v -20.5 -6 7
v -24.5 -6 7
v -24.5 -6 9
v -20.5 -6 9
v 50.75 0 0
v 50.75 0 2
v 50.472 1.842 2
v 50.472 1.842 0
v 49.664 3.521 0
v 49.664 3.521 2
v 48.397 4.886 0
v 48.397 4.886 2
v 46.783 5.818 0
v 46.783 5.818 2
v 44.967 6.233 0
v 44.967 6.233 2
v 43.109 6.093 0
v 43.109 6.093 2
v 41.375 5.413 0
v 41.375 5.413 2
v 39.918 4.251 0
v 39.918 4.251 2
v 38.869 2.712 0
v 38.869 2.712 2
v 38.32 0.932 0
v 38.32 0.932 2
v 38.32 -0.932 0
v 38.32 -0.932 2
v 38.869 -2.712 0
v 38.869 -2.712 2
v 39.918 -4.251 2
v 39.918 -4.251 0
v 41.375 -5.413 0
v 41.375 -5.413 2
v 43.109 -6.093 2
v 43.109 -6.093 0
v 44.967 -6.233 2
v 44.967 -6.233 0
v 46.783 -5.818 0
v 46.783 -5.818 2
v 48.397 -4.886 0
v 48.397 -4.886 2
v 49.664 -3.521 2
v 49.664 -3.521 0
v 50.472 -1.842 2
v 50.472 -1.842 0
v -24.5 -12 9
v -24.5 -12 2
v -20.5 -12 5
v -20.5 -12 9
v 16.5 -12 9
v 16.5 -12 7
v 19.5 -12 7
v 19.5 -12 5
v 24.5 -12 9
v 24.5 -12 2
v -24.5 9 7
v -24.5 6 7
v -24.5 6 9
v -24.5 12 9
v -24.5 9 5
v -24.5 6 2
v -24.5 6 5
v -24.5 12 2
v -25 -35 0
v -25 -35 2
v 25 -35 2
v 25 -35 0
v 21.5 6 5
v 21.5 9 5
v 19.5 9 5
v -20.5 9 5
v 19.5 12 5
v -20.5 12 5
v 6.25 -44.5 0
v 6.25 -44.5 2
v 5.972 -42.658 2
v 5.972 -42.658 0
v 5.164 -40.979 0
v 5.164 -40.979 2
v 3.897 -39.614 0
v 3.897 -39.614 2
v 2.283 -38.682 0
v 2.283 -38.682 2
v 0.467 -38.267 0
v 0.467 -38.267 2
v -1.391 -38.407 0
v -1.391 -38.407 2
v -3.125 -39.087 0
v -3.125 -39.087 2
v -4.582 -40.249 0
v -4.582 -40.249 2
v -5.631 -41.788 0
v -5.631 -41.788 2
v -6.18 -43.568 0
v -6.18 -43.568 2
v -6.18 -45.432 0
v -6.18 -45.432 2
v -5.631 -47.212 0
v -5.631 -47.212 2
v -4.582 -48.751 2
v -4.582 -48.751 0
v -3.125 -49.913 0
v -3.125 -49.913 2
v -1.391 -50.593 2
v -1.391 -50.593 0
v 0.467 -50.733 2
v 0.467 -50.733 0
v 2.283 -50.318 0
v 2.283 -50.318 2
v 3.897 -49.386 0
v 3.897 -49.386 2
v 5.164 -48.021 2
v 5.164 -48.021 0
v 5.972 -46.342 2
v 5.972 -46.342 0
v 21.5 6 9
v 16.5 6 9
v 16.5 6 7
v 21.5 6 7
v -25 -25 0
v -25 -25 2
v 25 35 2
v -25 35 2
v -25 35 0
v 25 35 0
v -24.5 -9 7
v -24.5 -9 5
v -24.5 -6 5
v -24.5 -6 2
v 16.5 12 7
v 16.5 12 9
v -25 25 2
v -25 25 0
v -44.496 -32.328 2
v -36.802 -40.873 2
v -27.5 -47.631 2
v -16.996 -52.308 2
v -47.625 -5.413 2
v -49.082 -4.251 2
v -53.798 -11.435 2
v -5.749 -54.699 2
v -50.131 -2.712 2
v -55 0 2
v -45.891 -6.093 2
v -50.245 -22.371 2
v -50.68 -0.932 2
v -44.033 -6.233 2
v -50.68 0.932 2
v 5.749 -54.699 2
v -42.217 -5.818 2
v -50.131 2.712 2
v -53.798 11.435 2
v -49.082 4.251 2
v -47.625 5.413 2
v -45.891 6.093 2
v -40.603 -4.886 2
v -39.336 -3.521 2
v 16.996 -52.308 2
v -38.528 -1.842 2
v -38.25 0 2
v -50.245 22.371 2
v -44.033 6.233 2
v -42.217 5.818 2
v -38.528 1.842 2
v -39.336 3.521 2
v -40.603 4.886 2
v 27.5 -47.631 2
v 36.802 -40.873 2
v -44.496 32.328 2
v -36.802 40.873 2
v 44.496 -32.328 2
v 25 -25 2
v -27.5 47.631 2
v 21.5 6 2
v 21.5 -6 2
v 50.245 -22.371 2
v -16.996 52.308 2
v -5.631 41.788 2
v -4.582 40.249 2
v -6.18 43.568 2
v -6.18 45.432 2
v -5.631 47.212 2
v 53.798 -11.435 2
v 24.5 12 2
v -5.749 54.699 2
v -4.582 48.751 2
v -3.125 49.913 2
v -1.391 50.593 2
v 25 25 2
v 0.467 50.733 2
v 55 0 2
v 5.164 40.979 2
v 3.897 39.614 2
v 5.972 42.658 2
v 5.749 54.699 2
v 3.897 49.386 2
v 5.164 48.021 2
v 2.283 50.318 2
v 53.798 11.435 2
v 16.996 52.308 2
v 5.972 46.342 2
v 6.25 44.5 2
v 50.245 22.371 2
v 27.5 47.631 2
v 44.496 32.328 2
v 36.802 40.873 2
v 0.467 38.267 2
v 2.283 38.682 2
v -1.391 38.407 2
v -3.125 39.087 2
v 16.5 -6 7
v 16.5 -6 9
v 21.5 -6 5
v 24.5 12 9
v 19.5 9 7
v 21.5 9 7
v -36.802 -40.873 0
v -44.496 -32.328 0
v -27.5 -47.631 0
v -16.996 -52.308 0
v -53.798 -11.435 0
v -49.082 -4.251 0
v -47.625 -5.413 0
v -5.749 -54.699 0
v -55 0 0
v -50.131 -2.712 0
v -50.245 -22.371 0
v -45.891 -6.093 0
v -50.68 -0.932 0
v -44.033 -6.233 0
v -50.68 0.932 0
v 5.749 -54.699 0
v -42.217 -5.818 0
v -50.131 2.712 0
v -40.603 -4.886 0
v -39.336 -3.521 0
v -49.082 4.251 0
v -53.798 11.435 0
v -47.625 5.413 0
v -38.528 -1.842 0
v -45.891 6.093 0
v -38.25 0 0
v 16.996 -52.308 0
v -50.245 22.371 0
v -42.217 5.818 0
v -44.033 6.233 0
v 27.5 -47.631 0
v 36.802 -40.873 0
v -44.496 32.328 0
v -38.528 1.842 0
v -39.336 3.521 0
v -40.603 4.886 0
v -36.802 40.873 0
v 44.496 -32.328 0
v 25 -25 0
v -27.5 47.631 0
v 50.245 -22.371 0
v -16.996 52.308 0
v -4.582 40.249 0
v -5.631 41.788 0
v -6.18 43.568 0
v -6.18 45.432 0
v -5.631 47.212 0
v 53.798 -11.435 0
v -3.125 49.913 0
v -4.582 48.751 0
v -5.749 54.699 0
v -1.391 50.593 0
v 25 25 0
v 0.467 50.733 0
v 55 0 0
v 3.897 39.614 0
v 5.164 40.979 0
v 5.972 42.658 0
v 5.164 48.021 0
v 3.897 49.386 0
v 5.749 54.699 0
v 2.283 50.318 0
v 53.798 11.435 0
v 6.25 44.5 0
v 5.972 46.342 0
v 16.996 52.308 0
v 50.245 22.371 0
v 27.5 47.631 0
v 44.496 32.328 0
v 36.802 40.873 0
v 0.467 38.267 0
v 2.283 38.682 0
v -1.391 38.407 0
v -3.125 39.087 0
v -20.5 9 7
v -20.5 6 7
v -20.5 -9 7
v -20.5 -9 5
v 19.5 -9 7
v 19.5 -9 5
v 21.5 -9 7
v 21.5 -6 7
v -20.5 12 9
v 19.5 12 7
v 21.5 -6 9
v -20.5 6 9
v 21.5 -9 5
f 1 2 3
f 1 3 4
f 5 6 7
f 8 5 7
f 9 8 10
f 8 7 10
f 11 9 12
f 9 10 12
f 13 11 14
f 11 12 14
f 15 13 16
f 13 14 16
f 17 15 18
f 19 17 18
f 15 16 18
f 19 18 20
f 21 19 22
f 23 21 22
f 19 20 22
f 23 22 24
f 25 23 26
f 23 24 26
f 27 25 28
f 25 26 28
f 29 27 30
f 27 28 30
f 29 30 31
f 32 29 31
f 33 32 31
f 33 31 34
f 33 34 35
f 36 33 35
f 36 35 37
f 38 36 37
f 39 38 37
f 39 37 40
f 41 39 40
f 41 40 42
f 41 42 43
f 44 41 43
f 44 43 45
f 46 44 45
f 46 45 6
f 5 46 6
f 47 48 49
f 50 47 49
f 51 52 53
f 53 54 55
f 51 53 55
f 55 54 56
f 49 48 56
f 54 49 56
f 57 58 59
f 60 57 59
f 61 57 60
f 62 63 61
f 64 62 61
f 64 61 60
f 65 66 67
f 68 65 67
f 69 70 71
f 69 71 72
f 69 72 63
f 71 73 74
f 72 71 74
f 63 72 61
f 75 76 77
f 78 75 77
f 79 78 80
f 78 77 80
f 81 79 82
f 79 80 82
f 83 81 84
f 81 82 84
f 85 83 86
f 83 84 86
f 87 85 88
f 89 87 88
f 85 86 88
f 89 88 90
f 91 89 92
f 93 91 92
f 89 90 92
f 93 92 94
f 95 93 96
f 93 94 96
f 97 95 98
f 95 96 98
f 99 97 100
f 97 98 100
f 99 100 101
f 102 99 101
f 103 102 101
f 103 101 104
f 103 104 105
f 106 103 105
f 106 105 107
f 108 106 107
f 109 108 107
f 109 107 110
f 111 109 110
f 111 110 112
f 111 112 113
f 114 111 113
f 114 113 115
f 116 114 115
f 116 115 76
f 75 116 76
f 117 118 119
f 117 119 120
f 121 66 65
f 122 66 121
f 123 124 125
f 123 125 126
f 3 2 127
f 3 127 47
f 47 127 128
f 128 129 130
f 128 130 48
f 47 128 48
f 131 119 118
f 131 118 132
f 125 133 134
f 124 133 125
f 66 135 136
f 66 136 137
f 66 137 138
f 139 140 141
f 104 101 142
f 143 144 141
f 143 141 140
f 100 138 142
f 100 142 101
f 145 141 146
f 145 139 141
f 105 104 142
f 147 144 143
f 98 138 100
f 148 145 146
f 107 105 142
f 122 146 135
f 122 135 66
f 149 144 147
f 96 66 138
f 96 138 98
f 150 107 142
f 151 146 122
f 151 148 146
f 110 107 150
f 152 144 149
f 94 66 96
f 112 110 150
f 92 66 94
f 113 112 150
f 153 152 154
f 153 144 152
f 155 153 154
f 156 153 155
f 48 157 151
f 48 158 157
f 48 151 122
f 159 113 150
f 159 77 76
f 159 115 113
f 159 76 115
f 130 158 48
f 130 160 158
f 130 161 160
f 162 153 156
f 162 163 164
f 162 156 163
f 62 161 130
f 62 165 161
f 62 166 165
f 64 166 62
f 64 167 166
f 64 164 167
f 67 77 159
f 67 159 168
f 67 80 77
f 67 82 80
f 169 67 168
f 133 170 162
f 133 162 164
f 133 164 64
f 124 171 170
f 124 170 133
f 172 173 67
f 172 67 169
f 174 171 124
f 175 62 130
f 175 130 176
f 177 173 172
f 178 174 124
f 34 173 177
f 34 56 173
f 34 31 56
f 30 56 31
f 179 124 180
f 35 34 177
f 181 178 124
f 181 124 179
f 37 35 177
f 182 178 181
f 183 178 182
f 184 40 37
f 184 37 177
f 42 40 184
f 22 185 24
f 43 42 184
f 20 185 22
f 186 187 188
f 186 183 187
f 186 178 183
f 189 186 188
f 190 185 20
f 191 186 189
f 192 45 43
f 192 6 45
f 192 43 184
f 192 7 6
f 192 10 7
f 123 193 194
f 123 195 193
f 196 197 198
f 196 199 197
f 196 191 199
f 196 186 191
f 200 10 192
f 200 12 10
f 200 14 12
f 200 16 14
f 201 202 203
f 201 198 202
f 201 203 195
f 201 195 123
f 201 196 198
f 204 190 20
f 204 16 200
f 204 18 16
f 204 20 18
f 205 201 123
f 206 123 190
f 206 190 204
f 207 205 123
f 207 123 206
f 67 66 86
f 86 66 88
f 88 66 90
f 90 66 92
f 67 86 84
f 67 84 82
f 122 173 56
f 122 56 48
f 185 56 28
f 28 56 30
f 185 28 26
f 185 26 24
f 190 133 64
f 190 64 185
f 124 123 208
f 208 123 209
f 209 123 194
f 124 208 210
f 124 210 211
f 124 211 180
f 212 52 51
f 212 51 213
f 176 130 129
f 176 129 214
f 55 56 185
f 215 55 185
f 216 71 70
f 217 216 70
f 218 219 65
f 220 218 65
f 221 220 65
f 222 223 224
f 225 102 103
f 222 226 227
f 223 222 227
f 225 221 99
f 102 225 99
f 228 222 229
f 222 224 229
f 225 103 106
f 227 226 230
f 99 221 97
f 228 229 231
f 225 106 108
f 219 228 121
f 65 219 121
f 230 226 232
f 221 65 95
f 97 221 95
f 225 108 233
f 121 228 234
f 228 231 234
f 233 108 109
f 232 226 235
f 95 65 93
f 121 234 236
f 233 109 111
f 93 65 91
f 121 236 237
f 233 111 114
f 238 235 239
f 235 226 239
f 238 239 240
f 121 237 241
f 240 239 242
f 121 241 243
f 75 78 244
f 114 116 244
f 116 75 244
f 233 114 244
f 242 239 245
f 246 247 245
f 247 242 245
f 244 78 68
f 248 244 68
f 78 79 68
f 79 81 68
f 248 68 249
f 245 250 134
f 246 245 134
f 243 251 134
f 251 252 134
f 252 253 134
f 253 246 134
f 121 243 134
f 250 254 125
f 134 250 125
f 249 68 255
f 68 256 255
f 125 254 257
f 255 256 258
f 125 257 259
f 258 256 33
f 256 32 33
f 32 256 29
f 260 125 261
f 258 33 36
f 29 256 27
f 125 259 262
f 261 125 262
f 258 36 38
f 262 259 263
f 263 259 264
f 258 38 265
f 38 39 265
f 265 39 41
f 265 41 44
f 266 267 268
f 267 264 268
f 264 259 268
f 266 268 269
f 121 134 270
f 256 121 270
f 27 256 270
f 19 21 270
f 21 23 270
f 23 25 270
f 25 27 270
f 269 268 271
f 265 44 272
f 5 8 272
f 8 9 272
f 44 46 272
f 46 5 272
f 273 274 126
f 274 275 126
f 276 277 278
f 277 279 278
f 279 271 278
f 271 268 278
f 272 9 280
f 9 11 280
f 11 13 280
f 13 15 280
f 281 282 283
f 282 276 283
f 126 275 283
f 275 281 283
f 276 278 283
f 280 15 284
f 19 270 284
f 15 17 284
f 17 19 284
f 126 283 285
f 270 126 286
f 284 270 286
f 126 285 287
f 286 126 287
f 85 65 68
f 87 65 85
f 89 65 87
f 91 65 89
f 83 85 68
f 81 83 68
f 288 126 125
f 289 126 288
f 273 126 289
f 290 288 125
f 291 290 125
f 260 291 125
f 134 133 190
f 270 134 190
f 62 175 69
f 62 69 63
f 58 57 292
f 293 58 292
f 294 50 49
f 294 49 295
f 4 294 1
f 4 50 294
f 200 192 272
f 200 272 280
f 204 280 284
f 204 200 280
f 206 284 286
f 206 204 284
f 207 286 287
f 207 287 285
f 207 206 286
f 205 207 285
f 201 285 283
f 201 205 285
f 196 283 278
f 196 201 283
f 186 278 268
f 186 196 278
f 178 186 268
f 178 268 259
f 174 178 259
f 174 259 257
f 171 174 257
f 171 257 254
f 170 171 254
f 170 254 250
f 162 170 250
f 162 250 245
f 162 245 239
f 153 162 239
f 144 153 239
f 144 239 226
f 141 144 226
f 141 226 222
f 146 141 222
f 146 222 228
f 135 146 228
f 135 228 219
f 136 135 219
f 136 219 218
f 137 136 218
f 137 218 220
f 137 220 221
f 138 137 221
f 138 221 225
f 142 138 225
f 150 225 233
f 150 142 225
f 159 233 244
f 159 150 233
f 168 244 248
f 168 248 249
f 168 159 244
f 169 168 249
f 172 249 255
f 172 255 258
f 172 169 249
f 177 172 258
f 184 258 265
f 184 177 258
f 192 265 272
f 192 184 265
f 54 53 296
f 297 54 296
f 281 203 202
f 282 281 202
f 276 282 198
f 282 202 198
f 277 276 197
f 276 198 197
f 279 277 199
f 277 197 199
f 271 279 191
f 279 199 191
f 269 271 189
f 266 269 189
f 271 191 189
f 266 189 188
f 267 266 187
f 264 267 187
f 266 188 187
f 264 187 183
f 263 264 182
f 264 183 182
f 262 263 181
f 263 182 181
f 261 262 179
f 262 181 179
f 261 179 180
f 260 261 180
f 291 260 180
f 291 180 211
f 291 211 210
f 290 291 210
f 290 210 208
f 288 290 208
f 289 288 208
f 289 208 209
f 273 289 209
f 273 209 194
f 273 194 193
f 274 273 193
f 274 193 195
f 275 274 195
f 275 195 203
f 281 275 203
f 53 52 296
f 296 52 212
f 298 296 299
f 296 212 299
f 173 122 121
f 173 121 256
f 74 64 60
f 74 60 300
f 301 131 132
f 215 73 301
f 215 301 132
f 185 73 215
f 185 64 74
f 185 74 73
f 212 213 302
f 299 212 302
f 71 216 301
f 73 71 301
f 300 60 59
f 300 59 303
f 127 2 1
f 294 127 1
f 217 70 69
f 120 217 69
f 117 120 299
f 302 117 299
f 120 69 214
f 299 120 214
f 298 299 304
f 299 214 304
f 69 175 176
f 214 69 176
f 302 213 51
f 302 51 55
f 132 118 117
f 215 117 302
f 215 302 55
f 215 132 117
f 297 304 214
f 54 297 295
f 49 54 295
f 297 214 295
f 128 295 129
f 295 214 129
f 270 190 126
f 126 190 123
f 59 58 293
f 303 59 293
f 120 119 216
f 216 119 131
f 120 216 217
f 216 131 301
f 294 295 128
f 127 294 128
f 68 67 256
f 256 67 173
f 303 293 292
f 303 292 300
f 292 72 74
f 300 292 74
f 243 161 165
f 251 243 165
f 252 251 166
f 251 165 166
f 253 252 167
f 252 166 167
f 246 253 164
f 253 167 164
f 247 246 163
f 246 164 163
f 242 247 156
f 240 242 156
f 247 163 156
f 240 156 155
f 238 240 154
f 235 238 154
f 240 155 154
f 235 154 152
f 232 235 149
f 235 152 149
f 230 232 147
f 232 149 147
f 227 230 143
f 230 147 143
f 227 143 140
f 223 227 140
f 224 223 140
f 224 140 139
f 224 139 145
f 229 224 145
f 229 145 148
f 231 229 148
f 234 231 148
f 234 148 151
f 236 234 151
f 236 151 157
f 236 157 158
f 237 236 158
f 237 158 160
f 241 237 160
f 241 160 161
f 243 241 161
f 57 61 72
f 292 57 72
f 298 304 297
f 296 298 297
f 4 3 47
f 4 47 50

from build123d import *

# Parameters (mm, degrees)
SKETCH4_R            = 59
BOSS_EXTRUDE3_DEPTH  = 2
SKETCH5_R            = 1.375
BOSS_EXTRUDE5_DEPTH  = 7
SKETCH8_R            = 2.375
BOSS_EXTRUDE6_DEPTH  = 2
BOSS_EXTRUDE7_DEPTH  = 18
SKETCH10_R           = 7.5
CUT_EXTRUDE1_DEPTH   = 18
SKETCH12_R           = 57.5
CUT_EXTRUDE2_DEPTH   = 5
CUT_EXTRUDE3_DEPTH   = 5.5
SKETCH14_R           = 44.428135616
CUT_EXTRUDE4_DEPTH   = 32
BOSS_EXTRUDE8_DEPTH  = 3
BOSS_EXTRUDE9_DEPTH  = 2
SKETCH18_W           = 40
SKETCH18_H           = 24
CUT_EXTRUDE5_DEPTH   = 2
SKETCH19_W           = 4
SKETCH19_H           = 6
SKETCH19_W_2         = 8
SKETCH19_H_2         = 24
BOSS_EXTRUDE10_DEPTH = 2
SKETCH20_R           = 71.034408428
SKETCH20_R_2         = 50.972397724
CUT_EXTRUDE6_DEPTH   = 57
SKETCH21_R           = 79.144233261
SKETCH21_R_2         = 57
CUT_EXTRUDE8_DEPTH   = 57
BOSS_EXTRUDE11_DEPTH = 22
SKETCH24_R           = 89.588110905
SKETCH24_R_2         = 57
CUT_EXTRUDE12_DEPTH  = 75
SKETCH25_R           = 63.08525578
SKETCH25_R_2         = 55
CUT_EXTRUDE13_DEPTH  = 10
SKETCH26_R           = 62.71577626
SKETCH26_R_2         = 55
CUT_EXTRUDE14_DEPTH  = 43
SKETCH27_R           = 8.628716001
SKETCH27_R_2         = 7.77122145
SKETCH27_R_3         = 11.532169803
SKETCH27_R_4         = 7.052668864
CUT_EXTRUDE15_DEPTH  = 22
SKETCH28_R           = 55
BOSS_EXTRUDE12_DEPTH = 2
SKETCH29_W           = 5
SKETCH29_H           = 12
CUT_EXTRUDE16_DEPTH  = 3
SKETCH30_R           = 6.25
CUT_EXTRUDE17_DEPTH  = 3
SKETCH31_W           = 50
SKETCH31_H           = 10
CUT_EXTRUDE18_DEPTH  = 3


with BuildPart() as part:
    # Sketch4 → Boss-Extrude3 (new body)
    with BuildSketch(Plane.XY):
        Circle(SKETCH4_R)
    extrude(amount=BOSS_EXTRUDE3_DEPTH)

    # Sketch5 → Boss-Extrude5 (add)
    with BuildSketch(Plane.XY.offset(2)):
        with Locations((-22.5, 27.5)):
            Circle(SKETCH5_R)
        with Locations((22.5, 27.5)):
            Circle(SKETCH5_R)
        with Locations((22.5, -27.5)):
            Circle(SKETCH5_R)
        with Locations((-22.5, -27.5)):
            Circle(SKETCH5_R)
    extrude(amount=BOSS_EXTRUDE5_DEPTH)

    # Sketch8 → Boss-Extrude6 (add)
    with BuildSketch(Plane.XY.offset(2)):
        with Locations((-22.5, 27.5)):
            Circle(SKETCH8_R)
        with Locations((22.5, 27.5)):
            Circle(SKETCH8_R)
        with Locations((-22.5, -27.5)):
            Circle(SKETCH8_R)
        with Locations((22.5, -27.5)):
            Circle(SKETCH8_R)
    extrude(amount=BOSS_EXTRUDE6_DEPTH)

    # Sketch9 → Boss-Extrude7 (add)
    with BuildSketch(Plane.XY.offset(2)):
        with BuildLine():
            ThreePointArc((-4.745762712, 55.798546005), (0, 56), (4.745762712, 55.798546005))
            Line((4.745762712, 55.798546005), (5, 58.787753827))
            ThreePointArc((5, 58.787753827), (0, 59), (-5, 58.787753827))
            Line((-5, 58.787753827), (-4.745762712, 55.798546005))
        make_face()
        with BuildLine():
            Line((-55.798546005, 4.745762712), (-58.787753827, 5))
            ThreePointArc((-58.787753827, 5), (-59, 0), (-58.787753827, -5))
            Line((-58.787753827, -5), (-55.798546005, -4.745762712))
            ThreePointArc((-55.798546005, -4.745762712), (-56, 0), (-55.798546005, 4.745762712))
        make_face()
        with BuildLine():
            ThreePointArc((58.787753827, -5), (59, 0), (58.787753827, 5))
            Line((58.787753827, 5), (55.798546005, 4.745762712))
            ThreePointArc((55.798546005, 4.745762712), (56, 0), (55.798546005, -4.745762712))
            Line((55.798546005, -4.745762712), (58.787753827, -5))
        make_face()
        with BuildLine():
            ThreePointArc((-4.745762712, -55.798546005), (0, -56), (4.745762712, -55.798546005))
            Line((4.745762712, -55.798546005), (5, -58.787753827))
            ThreePointArc((5, -58.787753827), (0, -59), (-5, -58.787753827))
            Line((-5, -58.787753827), (-4.745762712, -55.798546005))
        make_face()
    extrude(amount=BOSS_EXTRUDE7_DEPTH)

    # Sketch10 → Cut-Extrude1 (cut)
    with BuildSketch(Plane.XY.offset(2)):
        with Locations((-40, 0)):
            Circle(SKETCH10_R)
    extrude(amount=-CUT_EXTRUDE1_DEPTH, mode=Mode.SUBTRACT)

    # Sketch12 → Cut-Extrude2 (cut)
    with BuildSketch(Plane.XY.offset(20)):
        Circle(SKETCH12_R)
    extrude(amount=-CUT_EXTRUDE2_DEPTH, mode=Mode.SUBTRACT)

    # Sketch13 → Cut-Extrude3 (cut)
    with BuildSketch(Plane(origin=(0, 0, 0), x_dir=(-1, 0, 0), z_dir=(0, 0, -1))):
        with BuildLine():
            Line((-57.243329786, 4.868644068), (-58.787753827, 5))
            ThreePointArc((-58.787753827, 5), (-59, 0), (-58.787753827, -5))
            Line((-58.787753827, -5), (-57.243329786, -4.868644068))
            ThreePointArc((-57.243329786, -4.868644068), (-57.45, 0), (-57.243329786, 4.868644068))
        make_face()
        with BuildLine():
            ThreePointArc((5, 58.787753827), (0, 59), (-5, 58.787753827))
            Line((-5, 58.787753827), (-4.868644068, 57.243329786))
            ThreePointArc((-4.868644068, 57.243329786), (0, 57.45), (4.868644068, 57.243329786))
            Line((4.868644068, 57.243329786), (5, 58.787753827))
        make_face()
        with BuildLine():
            Line((-4.868644068, -57.243329786), (-5, -58.787753827))
            ThreePointArc((-5, -58.787753827), (0, -59), (5, -58.787753827))
            Line((5, -58.787753827), (4.868644068, -57.243329786))
            ThreePointArc((4.868644068, -57.243329786), (0, -57.45), (-4.868644068, -57.243329786))
        make_face()
        with BuildLine():
            ThreePointArc((58.787753827, -5), (59, 0), (58.787753827, 5))
            Line((58.787753827, 5), (57.243329786, 4.868644068))
            ThreePointArc((57.243329786, 4.868644068), (57.45, 0), (57.243329786, -4.868644068))
            Line((57.243329786, -4.868644068), (58.787753827, -5))
        make_face()
    extrude(amount=-CUT_EXTRUDE3_DEPTH, mode=Mode.SUBTRACT)

    # Sketch14 → Cut-Extrude4 (cut)
    with BuildSketch(Plane.XY.offset(2)):
        Circle(SKETCH14_R)
    extrude(amount=CUT_EXTRUDE4_DEPTH, mode=Mode.SUBTRACT)

    # Sketch15 → Boss-Extrude8 (add)
    with BuildSketch(Plane.XY.offset(2)):
        Polygon((21.5, -6), (21.5, 6), (-24.5, 6), (-24.5, 12), (24.5, 12), (24.5, -12), (-24.5, -12), (-24.5, -6), align=None)
    extrude(amount=BOSS_EXTRUDE8_DEPTH)

    # Sketch17 → Boss-Extrude9 (add)
    with BuildSketch(Plane.XY.offset(5)):
        Polygon((21.5, -9), (-21.5, -9), (-24.5, -9), (-24.5, -12), (24.5, -12), (24.5, 12), (-24.5, 12), (-24.5, 9), (-21.5, 9), (21.5, 9), align=None)
    extrude(amount=BOSS_EXTRUDE9_DEPTH)

    # Sketch18 → Cut-Extrude5 (cut)
    with BuildSketch(Plane.XY.offset(7)):
        with Locations((-0.5, 0)):
            Rectangle(SKETCH18_W, SKETCH18_H)
    extrude(amount=-CUT_EXTRUDE5_DEPTH, mode=Mode.SUBTRACT)

    # Sketch19 → Boss-Extrude10 (add)
    with BuildSketch(Plane.XY.offset(7)):
        with Locations((-22.5, 9)):
            Rectangle(SKETCH19_W, SKETCH19_H)
        with Locations((-22.5, -9)):
            Rectangle(SKETCH19_W, SKETCH19_H)
        with Locations((20.5, 0)):
            Rectangle(SKETCH19_W_2, SKETCH19_H_2)
    extrude(amount=BOSS_EXTRUDE10_DEPTH)

    # Sketch20 → Cut-Extrude6 (cut)
    with BuildSketch(Plane.XY.offset(2)):
        Circle(SKETCH20_R)
        Circle(SKETCH20_R_2, mode=Mode.SUBTRACT)
    extrude(amount=CUT_EXTRUDE6_DEPTH, mode=Mode.SUBTRACT)

    # Sketch21 → Cut-Extrude8 (cut)
    with BuildSketch(Plane.XY.offset(2)):
        Circle(SKETCH21_R)
        Circle(SKETCH21_R_2, mode=Mode.SUBTRACT)
    extrude(amount=-CUT_EXTRUDE8_DEPTH, mode=Mode.SUBTRACT)

    # Sketch23 → Boss-Extrude11 (add)
    with BuildSketch(Plane.XY.offset(2)):
        with BuildLine():
            ThreePointArc((4.98087362, 56.781959265), (2.492821884, 56.945463727), (0, 57))
            ThreePointArc((0, 57), (-2.492821884, 56.945463727), (-4.98087362, 56.781959265))
            Line((-4.98087362, 56.781959265), (-4.631338629, 52.797260369))
            ThreePointArc((-4.631338629, 52.797260369), (0, 53), (4.631338629, 52.797260369))
            Line((4.631338629, 52.797260369), (4.98087362, 56.781959265))
        make_face()
        with BuildLine():
            ThreePointArc((57, 0), (56.945463727, 2.492821884), (56.781959265, 4.98087362))
            Line((56.781959265, 4.98087362), (52.797260369, 4.631338629))
            ThreePointArc((52.797260369, 4.631338629), (53, 0), (52.797260369, -4.631338629))
            Line((52.797260369, -4.631338629), (56.781959265, -4.98087362))
            ThreePointArc((56.781959265, -4.98087362), (56.945463727, -2.492821884), (57, 0))
        make_face()
        with BuildLine():
            ThreePointArc((-52.797260369, 4.631338629), (-53, 0), (-52.797260369, -4.631338629))
            Line((-52.797260369, -4.631338629), (-57, -5))
            Line((-57, -5), (-57, 5))
            Line((-57, 5), (-52.797260369, 4.631338629))
        make_face()
        with BuildLine():
            ThreePointArc((-4.631338629, -52.797260369), (0, -53), (4.631338629, -52.797260369))
            Line((4.631338629, -52.797260369), (5, -57))
            Line((5, -57), (-5, -57))
            Line((-5, -57), (-4.631338629, -52.797260369))
        make_face()
    extrude(amount=BOSS_EXTRUDE11_DEPTH)

    # Sketch24 → Cut-Extrude12 (cut)
    with BuildSketch(Plane.XY.offset(24)):
        Circle(SKETCH24_R)
        Circle(SKETCH24_R_2, mode=Mode.SUBTRACT)
    extrude(amount=-CUT_EXTRUDE12_DEPTH, mode=Mode.SUBTRACT)

    # Sketch25 → Cut-Extrude13 (cut)
    with BuildSketch(Plane.XY.offset(2)):
        Circle(SKETCH25_R)
        Circle(SKETCH25_R_2, mode=Mode.SUBTRACT)
    extrude(amount=-CUT_EXTRUDE13_DEPTH, mode=Mode.SUBTRACT)

    # Sketch26 → Cut-Extrude14 (cut)
    with BuildSketch(Plane(origin=(0, 0, 0), x_dir=(-1, 0, 0), z_dir=(0, 0, -1))):
        Circle(SKETCH26_R)
        Circle(SKETCH26_R_2, mode=Mode.SUBTRACT)
    extrude(amount=-CUT_EXTRUDE14_DEPTH, mode=Mode.SUBTRACT)

    # Sketch27 → Cut-Extrude15 (cut)
    with BuildSketch(Plane.XY.offset(24)):
        with Locations((-55, 0)):
            Circle(SKETCH27_R)
        with Locations((0, -55)):
            Circle(SKETCH27_R_2)
        with Locations((55, 0)):
            Circle(SKETCH27_R_3)
        with Locations((0, 53)):
            Circle(SKETCH27_R_4)
    extrude(amount=-CUT_EXTRUDE15_DEPTH, mode=Mode.SUBTRACT)

    # Sketch28 → Boss-Extrude12 (add)
    with BuildSketch(Plane.XY.offset(2)):
        Circle(SKETCH28_R)
    extrude(amount=-BOSS_EXTRUDE12_DEPTH)

    # Sketch29 → Cut-Extrude16 (cut)
    with BuildSketch(Plane.XY.offset(9)):
        with Locations((19, 0)):
            Rectangle(SKETCH29_W, SKETCH29_H)
    extrude(amount=-CUT_EXTRUDE16_DEPTH, mode=Mode.SUBTRACT)

    # Sketch30 → Cut-Extrude17 (cut)
    with BuildSketch(Plane.XY.offset(2)):
        with Locations((0, 44.5)):
            Circle(SKETCH30_R)
        with Locations((44.5, 0)):
            Circle(SKETCH30_R)
        with Locations((0, -44.5)):
            Circle(SKETCH30_R)
        with Locations((-44.5, 0)):
            Circle(SKETCH30_R)
    extrude(amount=-CUT_EXTRUDE17_DEPTH, mode=Mode.SUBTRACT)

    # Sketch31 → Cut-Extrude18 (cut)
    with BuildSketch(Plane.XY.offset(2)):
        with Locations((0, 30)):
            Rectangle(SKETCH31_W, SKETCH31_H)
        with Locations((0, -30)):
            Rectangle(SKETCH31_W, SKETCH31_H)
    extrude(amount=-CUT_EXTRUDE18_DEPTH, mode=Mode.SUBTRACT)


solid = part.part
